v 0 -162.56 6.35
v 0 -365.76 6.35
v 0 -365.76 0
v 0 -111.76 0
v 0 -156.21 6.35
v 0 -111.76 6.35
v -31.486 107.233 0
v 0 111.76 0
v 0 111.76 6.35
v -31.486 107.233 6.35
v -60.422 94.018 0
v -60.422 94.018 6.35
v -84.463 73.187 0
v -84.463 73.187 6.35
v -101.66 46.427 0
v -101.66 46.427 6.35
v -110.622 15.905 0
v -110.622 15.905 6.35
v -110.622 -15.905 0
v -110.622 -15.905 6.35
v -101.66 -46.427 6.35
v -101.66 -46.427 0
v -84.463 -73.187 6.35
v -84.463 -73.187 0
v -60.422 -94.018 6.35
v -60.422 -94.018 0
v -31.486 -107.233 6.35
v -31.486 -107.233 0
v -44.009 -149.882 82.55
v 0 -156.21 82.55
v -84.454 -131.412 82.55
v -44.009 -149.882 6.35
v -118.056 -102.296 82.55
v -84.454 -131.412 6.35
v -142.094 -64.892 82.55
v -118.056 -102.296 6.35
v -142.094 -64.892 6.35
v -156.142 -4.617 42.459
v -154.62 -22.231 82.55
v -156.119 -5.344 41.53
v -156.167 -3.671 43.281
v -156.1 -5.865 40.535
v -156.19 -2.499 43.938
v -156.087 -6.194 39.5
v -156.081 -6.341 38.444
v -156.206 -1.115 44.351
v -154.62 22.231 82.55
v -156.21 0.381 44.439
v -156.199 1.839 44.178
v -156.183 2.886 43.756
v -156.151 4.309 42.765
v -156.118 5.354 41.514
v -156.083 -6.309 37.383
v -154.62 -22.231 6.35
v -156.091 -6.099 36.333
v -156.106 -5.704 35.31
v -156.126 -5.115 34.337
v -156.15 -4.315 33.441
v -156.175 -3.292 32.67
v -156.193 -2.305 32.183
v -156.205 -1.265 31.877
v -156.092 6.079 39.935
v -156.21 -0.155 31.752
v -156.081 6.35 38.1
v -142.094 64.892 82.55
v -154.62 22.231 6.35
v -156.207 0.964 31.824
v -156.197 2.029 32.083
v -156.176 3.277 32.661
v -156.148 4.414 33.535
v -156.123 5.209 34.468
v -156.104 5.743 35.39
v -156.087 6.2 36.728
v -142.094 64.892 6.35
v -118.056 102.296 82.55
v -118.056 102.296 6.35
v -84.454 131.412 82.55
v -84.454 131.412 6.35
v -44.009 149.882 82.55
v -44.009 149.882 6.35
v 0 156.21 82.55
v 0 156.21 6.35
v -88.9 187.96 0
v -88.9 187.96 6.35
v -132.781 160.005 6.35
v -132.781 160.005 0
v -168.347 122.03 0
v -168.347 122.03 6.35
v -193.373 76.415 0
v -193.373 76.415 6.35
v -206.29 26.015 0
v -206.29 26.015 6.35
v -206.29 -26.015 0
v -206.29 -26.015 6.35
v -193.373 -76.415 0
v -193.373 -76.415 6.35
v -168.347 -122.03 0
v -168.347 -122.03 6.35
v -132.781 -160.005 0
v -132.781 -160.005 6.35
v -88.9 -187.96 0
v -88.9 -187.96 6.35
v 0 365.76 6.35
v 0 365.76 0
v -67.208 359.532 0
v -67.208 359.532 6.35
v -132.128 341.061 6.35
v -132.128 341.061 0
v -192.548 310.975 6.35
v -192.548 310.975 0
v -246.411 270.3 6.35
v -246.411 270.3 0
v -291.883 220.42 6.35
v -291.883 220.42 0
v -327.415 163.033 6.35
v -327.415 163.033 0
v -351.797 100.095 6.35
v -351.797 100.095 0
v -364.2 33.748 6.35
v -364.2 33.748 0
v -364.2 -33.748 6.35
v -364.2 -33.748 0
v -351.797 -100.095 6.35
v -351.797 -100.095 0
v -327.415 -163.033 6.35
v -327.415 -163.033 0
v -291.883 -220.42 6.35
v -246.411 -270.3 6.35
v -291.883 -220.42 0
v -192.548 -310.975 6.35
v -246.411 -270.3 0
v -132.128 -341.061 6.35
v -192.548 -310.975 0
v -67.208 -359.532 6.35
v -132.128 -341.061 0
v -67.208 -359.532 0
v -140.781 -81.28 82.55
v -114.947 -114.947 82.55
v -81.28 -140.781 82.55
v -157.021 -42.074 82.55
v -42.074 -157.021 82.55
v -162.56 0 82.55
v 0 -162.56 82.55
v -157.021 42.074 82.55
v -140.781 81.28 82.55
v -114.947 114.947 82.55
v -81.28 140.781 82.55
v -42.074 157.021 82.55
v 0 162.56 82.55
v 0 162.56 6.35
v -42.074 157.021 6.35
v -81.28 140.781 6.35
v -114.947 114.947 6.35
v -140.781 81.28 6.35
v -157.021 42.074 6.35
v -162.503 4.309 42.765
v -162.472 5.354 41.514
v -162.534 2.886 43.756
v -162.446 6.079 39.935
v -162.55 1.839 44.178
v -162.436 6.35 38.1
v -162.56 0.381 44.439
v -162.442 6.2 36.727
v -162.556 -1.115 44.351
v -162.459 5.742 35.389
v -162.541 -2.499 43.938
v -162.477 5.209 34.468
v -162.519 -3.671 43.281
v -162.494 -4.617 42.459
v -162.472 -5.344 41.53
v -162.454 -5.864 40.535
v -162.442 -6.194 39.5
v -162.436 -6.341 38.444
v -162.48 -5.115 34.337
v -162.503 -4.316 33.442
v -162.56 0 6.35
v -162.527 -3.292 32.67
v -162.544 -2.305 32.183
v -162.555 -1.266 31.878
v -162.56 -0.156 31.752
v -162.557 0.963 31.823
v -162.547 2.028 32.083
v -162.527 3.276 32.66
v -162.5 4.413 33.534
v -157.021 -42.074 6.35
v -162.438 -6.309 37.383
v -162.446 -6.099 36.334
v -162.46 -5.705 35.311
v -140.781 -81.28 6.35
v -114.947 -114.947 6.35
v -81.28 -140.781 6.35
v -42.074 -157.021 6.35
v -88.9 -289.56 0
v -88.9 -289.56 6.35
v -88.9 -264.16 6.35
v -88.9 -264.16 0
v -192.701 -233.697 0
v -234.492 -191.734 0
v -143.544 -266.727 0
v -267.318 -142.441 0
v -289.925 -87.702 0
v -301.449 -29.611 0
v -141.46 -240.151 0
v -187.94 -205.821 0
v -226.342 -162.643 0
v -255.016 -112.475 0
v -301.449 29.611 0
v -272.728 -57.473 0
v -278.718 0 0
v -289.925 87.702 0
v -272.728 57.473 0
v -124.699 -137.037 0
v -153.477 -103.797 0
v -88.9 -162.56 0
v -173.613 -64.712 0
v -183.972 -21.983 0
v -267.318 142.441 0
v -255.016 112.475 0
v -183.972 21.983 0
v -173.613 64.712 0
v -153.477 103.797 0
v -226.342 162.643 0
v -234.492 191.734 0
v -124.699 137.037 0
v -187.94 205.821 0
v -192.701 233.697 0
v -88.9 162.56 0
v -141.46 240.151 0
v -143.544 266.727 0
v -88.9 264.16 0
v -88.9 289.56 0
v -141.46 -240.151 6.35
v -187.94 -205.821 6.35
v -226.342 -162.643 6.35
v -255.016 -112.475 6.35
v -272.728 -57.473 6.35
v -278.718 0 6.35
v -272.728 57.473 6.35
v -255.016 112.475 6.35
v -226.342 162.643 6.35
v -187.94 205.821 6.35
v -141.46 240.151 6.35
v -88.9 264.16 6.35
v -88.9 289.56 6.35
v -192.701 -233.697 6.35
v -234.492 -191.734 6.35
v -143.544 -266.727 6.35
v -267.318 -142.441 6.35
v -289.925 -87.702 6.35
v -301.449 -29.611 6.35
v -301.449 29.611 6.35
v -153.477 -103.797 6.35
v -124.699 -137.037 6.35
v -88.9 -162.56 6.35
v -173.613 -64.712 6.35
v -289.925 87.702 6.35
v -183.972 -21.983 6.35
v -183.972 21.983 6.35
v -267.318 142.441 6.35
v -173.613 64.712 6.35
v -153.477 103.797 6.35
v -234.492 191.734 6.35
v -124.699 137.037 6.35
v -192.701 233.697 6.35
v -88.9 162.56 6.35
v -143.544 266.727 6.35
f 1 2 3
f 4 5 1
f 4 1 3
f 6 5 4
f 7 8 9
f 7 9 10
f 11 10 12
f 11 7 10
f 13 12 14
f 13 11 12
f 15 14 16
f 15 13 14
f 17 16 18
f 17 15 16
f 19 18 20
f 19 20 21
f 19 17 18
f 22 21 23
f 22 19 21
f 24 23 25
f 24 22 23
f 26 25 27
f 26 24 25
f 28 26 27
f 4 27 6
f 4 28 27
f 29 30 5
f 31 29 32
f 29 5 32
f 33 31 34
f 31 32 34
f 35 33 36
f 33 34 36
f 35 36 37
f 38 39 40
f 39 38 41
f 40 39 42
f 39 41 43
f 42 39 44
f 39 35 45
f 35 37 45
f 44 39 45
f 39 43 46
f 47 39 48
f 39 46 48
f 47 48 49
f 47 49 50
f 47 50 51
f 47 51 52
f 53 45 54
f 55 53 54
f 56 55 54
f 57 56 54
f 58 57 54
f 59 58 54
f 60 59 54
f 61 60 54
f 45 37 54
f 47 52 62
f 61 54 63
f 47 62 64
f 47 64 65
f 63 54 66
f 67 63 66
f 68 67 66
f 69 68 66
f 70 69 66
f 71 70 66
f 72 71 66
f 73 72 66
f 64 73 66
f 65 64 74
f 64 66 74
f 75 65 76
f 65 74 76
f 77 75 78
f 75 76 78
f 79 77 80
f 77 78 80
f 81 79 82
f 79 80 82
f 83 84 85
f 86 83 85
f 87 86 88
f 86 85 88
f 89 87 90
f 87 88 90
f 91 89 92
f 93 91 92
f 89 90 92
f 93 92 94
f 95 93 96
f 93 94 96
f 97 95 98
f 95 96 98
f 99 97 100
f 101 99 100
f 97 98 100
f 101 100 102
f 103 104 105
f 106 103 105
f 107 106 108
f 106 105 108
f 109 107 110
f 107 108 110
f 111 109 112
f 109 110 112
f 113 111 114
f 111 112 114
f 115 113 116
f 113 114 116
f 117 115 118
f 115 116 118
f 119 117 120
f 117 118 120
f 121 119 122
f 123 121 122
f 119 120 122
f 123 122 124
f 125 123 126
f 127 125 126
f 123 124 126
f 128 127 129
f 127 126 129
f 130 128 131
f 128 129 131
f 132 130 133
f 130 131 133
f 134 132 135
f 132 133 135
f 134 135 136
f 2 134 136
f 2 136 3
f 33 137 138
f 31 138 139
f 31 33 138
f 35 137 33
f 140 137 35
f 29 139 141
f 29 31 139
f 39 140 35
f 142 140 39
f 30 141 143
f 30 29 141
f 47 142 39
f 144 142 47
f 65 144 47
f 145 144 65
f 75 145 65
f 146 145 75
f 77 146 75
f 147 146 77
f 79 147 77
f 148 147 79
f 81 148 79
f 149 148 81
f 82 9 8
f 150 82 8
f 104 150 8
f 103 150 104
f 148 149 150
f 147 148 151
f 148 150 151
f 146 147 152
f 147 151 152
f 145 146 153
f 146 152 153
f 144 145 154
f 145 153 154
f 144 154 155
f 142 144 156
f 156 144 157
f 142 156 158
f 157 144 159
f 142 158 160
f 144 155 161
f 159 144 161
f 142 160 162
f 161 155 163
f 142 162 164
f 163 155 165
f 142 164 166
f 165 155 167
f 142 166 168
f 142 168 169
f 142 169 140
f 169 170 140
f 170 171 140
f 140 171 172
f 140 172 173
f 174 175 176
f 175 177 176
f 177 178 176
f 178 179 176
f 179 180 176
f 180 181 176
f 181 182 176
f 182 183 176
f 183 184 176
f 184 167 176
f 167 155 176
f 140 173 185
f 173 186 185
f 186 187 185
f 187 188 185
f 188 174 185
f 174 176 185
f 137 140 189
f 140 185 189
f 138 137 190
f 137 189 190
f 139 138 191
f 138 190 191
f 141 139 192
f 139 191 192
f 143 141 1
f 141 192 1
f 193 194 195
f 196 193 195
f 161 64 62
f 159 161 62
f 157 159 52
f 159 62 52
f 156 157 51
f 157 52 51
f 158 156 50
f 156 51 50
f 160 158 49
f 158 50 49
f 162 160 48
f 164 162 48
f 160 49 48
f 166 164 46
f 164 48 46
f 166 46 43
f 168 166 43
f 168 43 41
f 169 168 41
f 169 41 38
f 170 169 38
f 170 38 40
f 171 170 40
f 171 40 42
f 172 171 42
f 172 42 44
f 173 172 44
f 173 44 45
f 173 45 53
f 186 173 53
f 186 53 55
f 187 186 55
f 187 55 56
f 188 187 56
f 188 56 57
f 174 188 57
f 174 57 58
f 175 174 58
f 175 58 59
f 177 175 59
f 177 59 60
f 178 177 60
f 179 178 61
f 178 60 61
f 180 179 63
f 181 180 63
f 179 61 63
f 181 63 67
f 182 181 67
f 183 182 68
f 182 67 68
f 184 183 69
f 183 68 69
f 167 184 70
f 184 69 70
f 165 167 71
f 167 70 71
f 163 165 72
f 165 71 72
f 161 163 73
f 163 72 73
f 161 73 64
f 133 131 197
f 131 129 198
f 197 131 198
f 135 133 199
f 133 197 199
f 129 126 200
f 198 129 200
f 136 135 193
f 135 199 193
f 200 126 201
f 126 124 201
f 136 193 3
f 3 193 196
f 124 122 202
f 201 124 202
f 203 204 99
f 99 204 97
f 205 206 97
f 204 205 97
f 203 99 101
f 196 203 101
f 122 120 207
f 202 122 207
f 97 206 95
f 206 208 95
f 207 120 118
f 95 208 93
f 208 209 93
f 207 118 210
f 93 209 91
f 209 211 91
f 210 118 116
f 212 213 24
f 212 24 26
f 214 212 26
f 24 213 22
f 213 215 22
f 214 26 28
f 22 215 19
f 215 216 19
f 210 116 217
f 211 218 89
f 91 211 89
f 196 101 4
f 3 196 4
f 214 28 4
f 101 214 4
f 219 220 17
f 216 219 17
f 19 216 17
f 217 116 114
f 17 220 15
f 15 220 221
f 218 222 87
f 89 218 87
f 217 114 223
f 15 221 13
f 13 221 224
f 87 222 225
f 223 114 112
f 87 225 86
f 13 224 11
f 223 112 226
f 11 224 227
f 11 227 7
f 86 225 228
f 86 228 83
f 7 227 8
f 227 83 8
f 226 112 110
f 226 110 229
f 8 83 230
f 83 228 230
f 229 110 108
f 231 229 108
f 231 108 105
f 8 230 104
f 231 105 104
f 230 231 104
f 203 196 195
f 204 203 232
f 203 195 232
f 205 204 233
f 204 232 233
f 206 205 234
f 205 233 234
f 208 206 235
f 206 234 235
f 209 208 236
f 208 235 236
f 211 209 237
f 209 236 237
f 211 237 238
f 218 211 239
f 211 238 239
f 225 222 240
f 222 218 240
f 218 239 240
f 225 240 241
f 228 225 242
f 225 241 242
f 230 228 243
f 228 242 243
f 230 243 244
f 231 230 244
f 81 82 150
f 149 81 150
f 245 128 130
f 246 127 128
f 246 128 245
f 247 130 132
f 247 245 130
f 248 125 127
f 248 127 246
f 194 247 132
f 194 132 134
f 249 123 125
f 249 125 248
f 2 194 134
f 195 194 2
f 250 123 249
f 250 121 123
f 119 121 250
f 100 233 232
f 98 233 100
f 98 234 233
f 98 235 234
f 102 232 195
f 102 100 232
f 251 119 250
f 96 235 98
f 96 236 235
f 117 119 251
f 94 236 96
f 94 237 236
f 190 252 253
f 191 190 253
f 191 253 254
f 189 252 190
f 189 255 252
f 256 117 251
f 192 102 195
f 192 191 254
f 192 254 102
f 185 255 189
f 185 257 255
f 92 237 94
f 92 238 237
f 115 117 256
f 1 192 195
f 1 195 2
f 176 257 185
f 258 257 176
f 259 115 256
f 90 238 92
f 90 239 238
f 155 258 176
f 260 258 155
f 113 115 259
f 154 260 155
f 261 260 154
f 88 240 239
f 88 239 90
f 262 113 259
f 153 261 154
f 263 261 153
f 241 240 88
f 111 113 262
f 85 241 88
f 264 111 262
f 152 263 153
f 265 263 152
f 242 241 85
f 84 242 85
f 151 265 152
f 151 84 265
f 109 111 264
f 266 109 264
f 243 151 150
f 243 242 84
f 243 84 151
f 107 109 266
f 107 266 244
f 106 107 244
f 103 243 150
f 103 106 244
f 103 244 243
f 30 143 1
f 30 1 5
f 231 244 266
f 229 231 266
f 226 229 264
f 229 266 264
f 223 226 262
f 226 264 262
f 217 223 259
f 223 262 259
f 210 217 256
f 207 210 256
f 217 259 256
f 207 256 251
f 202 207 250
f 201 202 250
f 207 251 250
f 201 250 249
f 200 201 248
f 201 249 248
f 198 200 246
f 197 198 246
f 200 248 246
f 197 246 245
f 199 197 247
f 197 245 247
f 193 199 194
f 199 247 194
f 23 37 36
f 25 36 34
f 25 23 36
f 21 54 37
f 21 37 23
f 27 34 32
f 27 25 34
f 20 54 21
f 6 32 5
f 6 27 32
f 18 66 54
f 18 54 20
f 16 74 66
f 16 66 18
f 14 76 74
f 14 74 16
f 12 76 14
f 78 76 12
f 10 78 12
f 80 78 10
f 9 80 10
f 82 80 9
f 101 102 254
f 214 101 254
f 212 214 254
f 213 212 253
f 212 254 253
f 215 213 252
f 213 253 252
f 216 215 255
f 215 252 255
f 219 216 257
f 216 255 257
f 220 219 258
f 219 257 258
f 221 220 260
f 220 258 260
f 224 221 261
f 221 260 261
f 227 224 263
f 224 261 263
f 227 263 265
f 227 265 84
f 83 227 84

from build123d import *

# Parameters (mm, degrees)
F0_R     = 365.76
F0_R_2   = 111.76
F1_DEPTH = 6.35
F2_W     = 380.011261
F2_H     = 787.612766
F3_DEPTH = 6.351
F5_DEPTH = 6.351
F7_DEPTH = 76.2
F8_R     = 6.35
F9_DEPTH = 365.761


with BuildPart() as f1:
    # F0 (on Top) → F1 (new body)
    with BuildSketch(Plane.XY):
        Circle(F0_R)
        Circle(F0_R_2, mode=Mode.SUBTRACT)
    extrude(amount=F1_DEPTH)

    # F2 (on face) → F3 (cut, through all)
    with BuildSketch(Plane.XY.offset(6.35)):
        with Locations((190.00563, 1.120374)):
            Rectangle(F2_W, F2_H)
    extrude(amount=-F3_DEPTH, mode=Mode.SUBTRACT)

    # F4 (on face) → F5 (cut, through all)
    with BuildSketch(Plane.XY.offset(6.35)):
        with BuildLine():
            ThreePointArc((-88.9, 289.56), (-302.899659, 0), (-88.9, -289.56))
            Line((-88.9, -289.56), (-88.9, -264.16))
            ThreePointArc((-88.9, -264.16), (-278.717986, 0), (-88.9, 264.16))
            Line((-88.9, 264.16), (-88.9, 289.56))
        make_face()
        with BuildLine():
            ThreePointArc((-88.9, 187.96), (-207.923475, 0), (-88.9, -187.96))
            Line((-88.9, -187.96), (-88.9, -162.56))
            ThreePointArc((-88.9, -162.56), (-185.28077, 0), (-88.9, 162.56))
            Line((-88.9, 162.56), (-88.9, 187.96))
        make_face()
    extrude(amount=-F5_DEPTH, mode=Mode.SUBTRACT)

    # F6 (on face) → F7 (join)
    with BuildSketch(Plane.XY.offset(6.35)):
        with BuildLine():
            Line((0, 156.21), (0, 162.56))
            ThreePointArc((0, 162.56), (-162.56, 0), (0, -162.56))
            Line((0, -162.56), (0, -156.21))
            ThreePointArc((0, -156.21), (-156.21, 0), (0, 156.21))
        make_face()
    extrude(amount=F7_DEPTH)

    # F8 (on Right) → F9 (cut, through all)
    with BuildSketch(Plane.YZ):
        with Locations((0, 38.1)):
            Circle(F8_R)
    extrude(amount=-F9_DEPTH, mode=Mode.SUBTRACT)


solid = f1.part
